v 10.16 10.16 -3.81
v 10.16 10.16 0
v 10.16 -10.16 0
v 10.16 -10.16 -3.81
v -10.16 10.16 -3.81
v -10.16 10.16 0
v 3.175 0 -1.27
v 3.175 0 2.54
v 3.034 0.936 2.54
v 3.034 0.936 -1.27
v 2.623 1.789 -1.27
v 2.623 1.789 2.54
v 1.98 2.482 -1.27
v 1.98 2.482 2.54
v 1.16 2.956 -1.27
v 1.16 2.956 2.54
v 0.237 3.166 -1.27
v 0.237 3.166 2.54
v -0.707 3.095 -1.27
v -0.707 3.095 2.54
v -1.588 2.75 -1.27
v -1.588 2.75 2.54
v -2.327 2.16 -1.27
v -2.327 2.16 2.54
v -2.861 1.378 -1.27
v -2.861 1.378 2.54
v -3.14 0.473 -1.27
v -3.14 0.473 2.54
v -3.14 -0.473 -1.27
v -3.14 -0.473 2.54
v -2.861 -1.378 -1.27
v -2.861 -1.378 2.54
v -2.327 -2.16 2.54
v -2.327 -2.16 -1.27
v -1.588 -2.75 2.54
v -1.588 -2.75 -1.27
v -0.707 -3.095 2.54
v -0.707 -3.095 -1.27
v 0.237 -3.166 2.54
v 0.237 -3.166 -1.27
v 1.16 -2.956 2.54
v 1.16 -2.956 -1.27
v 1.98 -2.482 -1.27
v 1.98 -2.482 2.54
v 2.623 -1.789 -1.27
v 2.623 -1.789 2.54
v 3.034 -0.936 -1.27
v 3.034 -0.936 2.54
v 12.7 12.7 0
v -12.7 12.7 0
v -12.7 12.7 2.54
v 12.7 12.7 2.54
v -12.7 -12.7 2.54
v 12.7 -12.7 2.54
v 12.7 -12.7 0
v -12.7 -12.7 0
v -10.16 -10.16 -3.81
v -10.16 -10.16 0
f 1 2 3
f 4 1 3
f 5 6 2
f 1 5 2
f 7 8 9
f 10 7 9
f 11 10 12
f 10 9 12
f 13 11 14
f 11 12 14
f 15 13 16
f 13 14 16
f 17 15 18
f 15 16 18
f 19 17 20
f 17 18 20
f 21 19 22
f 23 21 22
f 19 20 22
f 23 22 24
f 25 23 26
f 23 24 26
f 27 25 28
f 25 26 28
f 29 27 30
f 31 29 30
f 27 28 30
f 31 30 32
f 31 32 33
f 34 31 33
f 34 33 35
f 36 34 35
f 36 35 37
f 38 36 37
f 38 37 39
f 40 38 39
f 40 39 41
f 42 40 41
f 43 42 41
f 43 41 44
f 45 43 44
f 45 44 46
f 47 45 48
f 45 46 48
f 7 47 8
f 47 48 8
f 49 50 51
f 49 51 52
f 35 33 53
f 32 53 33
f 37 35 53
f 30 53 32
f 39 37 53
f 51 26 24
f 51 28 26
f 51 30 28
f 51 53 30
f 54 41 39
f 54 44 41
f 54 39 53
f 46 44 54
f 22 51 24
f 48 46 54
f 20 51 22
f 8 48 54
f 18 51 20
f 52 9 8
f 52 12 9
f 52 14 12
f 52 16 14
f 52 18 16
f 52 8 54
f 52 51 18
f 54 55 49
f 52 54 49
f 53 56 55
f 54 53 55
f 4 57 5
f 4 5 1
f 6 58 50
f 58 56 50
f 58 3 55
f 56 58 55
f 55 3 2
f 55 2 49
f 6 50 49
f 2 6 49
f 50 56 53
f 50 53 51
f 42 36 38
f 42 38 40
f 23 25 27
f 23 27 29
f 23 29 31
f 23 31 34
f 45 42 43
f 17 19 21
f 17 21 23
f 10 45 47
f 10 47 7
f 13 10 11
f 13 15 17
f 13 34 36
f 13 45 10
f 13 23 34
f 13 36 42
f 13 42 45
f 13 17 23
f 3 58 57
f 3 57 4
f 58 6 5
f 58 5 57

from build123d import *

# Parameters (mm, degrees)
F0_W     = 25.4
F0_H     = 25.4
F1_DEPTH = 2.54
F2_W     = 20.32
F2_H     = 20.32
F3_DEPTH = 3.81
F4_R     = 3.175
F5_DEPTH = 3.81


with BuildPart() as f1:
    # F0 (on Top) → F1 (new body)
    with BuildSketch(Plane.XY):
        Rectangle(F0_W, F0_H)
    extrude(amount=F1_DEPTH)

    # F2 (on face) → F3 (join)
    with BuildSketch(Plane(origin=(0, 0, 0), x_dir=(1, 0, 0), z_dir=(0, 0, -1))):
        Rectangle(F2_W, F2_H)
    extrude(amount=F3_DEPTH)

    # F4 (on face) → F5 (cut)
    with BuildSketch(Plane.XY.offset(2.54)):
        Circle(F4_R)
    extrude(amount=-F5_DEPTH, mode=Mode.SUBTRACT)


solid = f1.part
